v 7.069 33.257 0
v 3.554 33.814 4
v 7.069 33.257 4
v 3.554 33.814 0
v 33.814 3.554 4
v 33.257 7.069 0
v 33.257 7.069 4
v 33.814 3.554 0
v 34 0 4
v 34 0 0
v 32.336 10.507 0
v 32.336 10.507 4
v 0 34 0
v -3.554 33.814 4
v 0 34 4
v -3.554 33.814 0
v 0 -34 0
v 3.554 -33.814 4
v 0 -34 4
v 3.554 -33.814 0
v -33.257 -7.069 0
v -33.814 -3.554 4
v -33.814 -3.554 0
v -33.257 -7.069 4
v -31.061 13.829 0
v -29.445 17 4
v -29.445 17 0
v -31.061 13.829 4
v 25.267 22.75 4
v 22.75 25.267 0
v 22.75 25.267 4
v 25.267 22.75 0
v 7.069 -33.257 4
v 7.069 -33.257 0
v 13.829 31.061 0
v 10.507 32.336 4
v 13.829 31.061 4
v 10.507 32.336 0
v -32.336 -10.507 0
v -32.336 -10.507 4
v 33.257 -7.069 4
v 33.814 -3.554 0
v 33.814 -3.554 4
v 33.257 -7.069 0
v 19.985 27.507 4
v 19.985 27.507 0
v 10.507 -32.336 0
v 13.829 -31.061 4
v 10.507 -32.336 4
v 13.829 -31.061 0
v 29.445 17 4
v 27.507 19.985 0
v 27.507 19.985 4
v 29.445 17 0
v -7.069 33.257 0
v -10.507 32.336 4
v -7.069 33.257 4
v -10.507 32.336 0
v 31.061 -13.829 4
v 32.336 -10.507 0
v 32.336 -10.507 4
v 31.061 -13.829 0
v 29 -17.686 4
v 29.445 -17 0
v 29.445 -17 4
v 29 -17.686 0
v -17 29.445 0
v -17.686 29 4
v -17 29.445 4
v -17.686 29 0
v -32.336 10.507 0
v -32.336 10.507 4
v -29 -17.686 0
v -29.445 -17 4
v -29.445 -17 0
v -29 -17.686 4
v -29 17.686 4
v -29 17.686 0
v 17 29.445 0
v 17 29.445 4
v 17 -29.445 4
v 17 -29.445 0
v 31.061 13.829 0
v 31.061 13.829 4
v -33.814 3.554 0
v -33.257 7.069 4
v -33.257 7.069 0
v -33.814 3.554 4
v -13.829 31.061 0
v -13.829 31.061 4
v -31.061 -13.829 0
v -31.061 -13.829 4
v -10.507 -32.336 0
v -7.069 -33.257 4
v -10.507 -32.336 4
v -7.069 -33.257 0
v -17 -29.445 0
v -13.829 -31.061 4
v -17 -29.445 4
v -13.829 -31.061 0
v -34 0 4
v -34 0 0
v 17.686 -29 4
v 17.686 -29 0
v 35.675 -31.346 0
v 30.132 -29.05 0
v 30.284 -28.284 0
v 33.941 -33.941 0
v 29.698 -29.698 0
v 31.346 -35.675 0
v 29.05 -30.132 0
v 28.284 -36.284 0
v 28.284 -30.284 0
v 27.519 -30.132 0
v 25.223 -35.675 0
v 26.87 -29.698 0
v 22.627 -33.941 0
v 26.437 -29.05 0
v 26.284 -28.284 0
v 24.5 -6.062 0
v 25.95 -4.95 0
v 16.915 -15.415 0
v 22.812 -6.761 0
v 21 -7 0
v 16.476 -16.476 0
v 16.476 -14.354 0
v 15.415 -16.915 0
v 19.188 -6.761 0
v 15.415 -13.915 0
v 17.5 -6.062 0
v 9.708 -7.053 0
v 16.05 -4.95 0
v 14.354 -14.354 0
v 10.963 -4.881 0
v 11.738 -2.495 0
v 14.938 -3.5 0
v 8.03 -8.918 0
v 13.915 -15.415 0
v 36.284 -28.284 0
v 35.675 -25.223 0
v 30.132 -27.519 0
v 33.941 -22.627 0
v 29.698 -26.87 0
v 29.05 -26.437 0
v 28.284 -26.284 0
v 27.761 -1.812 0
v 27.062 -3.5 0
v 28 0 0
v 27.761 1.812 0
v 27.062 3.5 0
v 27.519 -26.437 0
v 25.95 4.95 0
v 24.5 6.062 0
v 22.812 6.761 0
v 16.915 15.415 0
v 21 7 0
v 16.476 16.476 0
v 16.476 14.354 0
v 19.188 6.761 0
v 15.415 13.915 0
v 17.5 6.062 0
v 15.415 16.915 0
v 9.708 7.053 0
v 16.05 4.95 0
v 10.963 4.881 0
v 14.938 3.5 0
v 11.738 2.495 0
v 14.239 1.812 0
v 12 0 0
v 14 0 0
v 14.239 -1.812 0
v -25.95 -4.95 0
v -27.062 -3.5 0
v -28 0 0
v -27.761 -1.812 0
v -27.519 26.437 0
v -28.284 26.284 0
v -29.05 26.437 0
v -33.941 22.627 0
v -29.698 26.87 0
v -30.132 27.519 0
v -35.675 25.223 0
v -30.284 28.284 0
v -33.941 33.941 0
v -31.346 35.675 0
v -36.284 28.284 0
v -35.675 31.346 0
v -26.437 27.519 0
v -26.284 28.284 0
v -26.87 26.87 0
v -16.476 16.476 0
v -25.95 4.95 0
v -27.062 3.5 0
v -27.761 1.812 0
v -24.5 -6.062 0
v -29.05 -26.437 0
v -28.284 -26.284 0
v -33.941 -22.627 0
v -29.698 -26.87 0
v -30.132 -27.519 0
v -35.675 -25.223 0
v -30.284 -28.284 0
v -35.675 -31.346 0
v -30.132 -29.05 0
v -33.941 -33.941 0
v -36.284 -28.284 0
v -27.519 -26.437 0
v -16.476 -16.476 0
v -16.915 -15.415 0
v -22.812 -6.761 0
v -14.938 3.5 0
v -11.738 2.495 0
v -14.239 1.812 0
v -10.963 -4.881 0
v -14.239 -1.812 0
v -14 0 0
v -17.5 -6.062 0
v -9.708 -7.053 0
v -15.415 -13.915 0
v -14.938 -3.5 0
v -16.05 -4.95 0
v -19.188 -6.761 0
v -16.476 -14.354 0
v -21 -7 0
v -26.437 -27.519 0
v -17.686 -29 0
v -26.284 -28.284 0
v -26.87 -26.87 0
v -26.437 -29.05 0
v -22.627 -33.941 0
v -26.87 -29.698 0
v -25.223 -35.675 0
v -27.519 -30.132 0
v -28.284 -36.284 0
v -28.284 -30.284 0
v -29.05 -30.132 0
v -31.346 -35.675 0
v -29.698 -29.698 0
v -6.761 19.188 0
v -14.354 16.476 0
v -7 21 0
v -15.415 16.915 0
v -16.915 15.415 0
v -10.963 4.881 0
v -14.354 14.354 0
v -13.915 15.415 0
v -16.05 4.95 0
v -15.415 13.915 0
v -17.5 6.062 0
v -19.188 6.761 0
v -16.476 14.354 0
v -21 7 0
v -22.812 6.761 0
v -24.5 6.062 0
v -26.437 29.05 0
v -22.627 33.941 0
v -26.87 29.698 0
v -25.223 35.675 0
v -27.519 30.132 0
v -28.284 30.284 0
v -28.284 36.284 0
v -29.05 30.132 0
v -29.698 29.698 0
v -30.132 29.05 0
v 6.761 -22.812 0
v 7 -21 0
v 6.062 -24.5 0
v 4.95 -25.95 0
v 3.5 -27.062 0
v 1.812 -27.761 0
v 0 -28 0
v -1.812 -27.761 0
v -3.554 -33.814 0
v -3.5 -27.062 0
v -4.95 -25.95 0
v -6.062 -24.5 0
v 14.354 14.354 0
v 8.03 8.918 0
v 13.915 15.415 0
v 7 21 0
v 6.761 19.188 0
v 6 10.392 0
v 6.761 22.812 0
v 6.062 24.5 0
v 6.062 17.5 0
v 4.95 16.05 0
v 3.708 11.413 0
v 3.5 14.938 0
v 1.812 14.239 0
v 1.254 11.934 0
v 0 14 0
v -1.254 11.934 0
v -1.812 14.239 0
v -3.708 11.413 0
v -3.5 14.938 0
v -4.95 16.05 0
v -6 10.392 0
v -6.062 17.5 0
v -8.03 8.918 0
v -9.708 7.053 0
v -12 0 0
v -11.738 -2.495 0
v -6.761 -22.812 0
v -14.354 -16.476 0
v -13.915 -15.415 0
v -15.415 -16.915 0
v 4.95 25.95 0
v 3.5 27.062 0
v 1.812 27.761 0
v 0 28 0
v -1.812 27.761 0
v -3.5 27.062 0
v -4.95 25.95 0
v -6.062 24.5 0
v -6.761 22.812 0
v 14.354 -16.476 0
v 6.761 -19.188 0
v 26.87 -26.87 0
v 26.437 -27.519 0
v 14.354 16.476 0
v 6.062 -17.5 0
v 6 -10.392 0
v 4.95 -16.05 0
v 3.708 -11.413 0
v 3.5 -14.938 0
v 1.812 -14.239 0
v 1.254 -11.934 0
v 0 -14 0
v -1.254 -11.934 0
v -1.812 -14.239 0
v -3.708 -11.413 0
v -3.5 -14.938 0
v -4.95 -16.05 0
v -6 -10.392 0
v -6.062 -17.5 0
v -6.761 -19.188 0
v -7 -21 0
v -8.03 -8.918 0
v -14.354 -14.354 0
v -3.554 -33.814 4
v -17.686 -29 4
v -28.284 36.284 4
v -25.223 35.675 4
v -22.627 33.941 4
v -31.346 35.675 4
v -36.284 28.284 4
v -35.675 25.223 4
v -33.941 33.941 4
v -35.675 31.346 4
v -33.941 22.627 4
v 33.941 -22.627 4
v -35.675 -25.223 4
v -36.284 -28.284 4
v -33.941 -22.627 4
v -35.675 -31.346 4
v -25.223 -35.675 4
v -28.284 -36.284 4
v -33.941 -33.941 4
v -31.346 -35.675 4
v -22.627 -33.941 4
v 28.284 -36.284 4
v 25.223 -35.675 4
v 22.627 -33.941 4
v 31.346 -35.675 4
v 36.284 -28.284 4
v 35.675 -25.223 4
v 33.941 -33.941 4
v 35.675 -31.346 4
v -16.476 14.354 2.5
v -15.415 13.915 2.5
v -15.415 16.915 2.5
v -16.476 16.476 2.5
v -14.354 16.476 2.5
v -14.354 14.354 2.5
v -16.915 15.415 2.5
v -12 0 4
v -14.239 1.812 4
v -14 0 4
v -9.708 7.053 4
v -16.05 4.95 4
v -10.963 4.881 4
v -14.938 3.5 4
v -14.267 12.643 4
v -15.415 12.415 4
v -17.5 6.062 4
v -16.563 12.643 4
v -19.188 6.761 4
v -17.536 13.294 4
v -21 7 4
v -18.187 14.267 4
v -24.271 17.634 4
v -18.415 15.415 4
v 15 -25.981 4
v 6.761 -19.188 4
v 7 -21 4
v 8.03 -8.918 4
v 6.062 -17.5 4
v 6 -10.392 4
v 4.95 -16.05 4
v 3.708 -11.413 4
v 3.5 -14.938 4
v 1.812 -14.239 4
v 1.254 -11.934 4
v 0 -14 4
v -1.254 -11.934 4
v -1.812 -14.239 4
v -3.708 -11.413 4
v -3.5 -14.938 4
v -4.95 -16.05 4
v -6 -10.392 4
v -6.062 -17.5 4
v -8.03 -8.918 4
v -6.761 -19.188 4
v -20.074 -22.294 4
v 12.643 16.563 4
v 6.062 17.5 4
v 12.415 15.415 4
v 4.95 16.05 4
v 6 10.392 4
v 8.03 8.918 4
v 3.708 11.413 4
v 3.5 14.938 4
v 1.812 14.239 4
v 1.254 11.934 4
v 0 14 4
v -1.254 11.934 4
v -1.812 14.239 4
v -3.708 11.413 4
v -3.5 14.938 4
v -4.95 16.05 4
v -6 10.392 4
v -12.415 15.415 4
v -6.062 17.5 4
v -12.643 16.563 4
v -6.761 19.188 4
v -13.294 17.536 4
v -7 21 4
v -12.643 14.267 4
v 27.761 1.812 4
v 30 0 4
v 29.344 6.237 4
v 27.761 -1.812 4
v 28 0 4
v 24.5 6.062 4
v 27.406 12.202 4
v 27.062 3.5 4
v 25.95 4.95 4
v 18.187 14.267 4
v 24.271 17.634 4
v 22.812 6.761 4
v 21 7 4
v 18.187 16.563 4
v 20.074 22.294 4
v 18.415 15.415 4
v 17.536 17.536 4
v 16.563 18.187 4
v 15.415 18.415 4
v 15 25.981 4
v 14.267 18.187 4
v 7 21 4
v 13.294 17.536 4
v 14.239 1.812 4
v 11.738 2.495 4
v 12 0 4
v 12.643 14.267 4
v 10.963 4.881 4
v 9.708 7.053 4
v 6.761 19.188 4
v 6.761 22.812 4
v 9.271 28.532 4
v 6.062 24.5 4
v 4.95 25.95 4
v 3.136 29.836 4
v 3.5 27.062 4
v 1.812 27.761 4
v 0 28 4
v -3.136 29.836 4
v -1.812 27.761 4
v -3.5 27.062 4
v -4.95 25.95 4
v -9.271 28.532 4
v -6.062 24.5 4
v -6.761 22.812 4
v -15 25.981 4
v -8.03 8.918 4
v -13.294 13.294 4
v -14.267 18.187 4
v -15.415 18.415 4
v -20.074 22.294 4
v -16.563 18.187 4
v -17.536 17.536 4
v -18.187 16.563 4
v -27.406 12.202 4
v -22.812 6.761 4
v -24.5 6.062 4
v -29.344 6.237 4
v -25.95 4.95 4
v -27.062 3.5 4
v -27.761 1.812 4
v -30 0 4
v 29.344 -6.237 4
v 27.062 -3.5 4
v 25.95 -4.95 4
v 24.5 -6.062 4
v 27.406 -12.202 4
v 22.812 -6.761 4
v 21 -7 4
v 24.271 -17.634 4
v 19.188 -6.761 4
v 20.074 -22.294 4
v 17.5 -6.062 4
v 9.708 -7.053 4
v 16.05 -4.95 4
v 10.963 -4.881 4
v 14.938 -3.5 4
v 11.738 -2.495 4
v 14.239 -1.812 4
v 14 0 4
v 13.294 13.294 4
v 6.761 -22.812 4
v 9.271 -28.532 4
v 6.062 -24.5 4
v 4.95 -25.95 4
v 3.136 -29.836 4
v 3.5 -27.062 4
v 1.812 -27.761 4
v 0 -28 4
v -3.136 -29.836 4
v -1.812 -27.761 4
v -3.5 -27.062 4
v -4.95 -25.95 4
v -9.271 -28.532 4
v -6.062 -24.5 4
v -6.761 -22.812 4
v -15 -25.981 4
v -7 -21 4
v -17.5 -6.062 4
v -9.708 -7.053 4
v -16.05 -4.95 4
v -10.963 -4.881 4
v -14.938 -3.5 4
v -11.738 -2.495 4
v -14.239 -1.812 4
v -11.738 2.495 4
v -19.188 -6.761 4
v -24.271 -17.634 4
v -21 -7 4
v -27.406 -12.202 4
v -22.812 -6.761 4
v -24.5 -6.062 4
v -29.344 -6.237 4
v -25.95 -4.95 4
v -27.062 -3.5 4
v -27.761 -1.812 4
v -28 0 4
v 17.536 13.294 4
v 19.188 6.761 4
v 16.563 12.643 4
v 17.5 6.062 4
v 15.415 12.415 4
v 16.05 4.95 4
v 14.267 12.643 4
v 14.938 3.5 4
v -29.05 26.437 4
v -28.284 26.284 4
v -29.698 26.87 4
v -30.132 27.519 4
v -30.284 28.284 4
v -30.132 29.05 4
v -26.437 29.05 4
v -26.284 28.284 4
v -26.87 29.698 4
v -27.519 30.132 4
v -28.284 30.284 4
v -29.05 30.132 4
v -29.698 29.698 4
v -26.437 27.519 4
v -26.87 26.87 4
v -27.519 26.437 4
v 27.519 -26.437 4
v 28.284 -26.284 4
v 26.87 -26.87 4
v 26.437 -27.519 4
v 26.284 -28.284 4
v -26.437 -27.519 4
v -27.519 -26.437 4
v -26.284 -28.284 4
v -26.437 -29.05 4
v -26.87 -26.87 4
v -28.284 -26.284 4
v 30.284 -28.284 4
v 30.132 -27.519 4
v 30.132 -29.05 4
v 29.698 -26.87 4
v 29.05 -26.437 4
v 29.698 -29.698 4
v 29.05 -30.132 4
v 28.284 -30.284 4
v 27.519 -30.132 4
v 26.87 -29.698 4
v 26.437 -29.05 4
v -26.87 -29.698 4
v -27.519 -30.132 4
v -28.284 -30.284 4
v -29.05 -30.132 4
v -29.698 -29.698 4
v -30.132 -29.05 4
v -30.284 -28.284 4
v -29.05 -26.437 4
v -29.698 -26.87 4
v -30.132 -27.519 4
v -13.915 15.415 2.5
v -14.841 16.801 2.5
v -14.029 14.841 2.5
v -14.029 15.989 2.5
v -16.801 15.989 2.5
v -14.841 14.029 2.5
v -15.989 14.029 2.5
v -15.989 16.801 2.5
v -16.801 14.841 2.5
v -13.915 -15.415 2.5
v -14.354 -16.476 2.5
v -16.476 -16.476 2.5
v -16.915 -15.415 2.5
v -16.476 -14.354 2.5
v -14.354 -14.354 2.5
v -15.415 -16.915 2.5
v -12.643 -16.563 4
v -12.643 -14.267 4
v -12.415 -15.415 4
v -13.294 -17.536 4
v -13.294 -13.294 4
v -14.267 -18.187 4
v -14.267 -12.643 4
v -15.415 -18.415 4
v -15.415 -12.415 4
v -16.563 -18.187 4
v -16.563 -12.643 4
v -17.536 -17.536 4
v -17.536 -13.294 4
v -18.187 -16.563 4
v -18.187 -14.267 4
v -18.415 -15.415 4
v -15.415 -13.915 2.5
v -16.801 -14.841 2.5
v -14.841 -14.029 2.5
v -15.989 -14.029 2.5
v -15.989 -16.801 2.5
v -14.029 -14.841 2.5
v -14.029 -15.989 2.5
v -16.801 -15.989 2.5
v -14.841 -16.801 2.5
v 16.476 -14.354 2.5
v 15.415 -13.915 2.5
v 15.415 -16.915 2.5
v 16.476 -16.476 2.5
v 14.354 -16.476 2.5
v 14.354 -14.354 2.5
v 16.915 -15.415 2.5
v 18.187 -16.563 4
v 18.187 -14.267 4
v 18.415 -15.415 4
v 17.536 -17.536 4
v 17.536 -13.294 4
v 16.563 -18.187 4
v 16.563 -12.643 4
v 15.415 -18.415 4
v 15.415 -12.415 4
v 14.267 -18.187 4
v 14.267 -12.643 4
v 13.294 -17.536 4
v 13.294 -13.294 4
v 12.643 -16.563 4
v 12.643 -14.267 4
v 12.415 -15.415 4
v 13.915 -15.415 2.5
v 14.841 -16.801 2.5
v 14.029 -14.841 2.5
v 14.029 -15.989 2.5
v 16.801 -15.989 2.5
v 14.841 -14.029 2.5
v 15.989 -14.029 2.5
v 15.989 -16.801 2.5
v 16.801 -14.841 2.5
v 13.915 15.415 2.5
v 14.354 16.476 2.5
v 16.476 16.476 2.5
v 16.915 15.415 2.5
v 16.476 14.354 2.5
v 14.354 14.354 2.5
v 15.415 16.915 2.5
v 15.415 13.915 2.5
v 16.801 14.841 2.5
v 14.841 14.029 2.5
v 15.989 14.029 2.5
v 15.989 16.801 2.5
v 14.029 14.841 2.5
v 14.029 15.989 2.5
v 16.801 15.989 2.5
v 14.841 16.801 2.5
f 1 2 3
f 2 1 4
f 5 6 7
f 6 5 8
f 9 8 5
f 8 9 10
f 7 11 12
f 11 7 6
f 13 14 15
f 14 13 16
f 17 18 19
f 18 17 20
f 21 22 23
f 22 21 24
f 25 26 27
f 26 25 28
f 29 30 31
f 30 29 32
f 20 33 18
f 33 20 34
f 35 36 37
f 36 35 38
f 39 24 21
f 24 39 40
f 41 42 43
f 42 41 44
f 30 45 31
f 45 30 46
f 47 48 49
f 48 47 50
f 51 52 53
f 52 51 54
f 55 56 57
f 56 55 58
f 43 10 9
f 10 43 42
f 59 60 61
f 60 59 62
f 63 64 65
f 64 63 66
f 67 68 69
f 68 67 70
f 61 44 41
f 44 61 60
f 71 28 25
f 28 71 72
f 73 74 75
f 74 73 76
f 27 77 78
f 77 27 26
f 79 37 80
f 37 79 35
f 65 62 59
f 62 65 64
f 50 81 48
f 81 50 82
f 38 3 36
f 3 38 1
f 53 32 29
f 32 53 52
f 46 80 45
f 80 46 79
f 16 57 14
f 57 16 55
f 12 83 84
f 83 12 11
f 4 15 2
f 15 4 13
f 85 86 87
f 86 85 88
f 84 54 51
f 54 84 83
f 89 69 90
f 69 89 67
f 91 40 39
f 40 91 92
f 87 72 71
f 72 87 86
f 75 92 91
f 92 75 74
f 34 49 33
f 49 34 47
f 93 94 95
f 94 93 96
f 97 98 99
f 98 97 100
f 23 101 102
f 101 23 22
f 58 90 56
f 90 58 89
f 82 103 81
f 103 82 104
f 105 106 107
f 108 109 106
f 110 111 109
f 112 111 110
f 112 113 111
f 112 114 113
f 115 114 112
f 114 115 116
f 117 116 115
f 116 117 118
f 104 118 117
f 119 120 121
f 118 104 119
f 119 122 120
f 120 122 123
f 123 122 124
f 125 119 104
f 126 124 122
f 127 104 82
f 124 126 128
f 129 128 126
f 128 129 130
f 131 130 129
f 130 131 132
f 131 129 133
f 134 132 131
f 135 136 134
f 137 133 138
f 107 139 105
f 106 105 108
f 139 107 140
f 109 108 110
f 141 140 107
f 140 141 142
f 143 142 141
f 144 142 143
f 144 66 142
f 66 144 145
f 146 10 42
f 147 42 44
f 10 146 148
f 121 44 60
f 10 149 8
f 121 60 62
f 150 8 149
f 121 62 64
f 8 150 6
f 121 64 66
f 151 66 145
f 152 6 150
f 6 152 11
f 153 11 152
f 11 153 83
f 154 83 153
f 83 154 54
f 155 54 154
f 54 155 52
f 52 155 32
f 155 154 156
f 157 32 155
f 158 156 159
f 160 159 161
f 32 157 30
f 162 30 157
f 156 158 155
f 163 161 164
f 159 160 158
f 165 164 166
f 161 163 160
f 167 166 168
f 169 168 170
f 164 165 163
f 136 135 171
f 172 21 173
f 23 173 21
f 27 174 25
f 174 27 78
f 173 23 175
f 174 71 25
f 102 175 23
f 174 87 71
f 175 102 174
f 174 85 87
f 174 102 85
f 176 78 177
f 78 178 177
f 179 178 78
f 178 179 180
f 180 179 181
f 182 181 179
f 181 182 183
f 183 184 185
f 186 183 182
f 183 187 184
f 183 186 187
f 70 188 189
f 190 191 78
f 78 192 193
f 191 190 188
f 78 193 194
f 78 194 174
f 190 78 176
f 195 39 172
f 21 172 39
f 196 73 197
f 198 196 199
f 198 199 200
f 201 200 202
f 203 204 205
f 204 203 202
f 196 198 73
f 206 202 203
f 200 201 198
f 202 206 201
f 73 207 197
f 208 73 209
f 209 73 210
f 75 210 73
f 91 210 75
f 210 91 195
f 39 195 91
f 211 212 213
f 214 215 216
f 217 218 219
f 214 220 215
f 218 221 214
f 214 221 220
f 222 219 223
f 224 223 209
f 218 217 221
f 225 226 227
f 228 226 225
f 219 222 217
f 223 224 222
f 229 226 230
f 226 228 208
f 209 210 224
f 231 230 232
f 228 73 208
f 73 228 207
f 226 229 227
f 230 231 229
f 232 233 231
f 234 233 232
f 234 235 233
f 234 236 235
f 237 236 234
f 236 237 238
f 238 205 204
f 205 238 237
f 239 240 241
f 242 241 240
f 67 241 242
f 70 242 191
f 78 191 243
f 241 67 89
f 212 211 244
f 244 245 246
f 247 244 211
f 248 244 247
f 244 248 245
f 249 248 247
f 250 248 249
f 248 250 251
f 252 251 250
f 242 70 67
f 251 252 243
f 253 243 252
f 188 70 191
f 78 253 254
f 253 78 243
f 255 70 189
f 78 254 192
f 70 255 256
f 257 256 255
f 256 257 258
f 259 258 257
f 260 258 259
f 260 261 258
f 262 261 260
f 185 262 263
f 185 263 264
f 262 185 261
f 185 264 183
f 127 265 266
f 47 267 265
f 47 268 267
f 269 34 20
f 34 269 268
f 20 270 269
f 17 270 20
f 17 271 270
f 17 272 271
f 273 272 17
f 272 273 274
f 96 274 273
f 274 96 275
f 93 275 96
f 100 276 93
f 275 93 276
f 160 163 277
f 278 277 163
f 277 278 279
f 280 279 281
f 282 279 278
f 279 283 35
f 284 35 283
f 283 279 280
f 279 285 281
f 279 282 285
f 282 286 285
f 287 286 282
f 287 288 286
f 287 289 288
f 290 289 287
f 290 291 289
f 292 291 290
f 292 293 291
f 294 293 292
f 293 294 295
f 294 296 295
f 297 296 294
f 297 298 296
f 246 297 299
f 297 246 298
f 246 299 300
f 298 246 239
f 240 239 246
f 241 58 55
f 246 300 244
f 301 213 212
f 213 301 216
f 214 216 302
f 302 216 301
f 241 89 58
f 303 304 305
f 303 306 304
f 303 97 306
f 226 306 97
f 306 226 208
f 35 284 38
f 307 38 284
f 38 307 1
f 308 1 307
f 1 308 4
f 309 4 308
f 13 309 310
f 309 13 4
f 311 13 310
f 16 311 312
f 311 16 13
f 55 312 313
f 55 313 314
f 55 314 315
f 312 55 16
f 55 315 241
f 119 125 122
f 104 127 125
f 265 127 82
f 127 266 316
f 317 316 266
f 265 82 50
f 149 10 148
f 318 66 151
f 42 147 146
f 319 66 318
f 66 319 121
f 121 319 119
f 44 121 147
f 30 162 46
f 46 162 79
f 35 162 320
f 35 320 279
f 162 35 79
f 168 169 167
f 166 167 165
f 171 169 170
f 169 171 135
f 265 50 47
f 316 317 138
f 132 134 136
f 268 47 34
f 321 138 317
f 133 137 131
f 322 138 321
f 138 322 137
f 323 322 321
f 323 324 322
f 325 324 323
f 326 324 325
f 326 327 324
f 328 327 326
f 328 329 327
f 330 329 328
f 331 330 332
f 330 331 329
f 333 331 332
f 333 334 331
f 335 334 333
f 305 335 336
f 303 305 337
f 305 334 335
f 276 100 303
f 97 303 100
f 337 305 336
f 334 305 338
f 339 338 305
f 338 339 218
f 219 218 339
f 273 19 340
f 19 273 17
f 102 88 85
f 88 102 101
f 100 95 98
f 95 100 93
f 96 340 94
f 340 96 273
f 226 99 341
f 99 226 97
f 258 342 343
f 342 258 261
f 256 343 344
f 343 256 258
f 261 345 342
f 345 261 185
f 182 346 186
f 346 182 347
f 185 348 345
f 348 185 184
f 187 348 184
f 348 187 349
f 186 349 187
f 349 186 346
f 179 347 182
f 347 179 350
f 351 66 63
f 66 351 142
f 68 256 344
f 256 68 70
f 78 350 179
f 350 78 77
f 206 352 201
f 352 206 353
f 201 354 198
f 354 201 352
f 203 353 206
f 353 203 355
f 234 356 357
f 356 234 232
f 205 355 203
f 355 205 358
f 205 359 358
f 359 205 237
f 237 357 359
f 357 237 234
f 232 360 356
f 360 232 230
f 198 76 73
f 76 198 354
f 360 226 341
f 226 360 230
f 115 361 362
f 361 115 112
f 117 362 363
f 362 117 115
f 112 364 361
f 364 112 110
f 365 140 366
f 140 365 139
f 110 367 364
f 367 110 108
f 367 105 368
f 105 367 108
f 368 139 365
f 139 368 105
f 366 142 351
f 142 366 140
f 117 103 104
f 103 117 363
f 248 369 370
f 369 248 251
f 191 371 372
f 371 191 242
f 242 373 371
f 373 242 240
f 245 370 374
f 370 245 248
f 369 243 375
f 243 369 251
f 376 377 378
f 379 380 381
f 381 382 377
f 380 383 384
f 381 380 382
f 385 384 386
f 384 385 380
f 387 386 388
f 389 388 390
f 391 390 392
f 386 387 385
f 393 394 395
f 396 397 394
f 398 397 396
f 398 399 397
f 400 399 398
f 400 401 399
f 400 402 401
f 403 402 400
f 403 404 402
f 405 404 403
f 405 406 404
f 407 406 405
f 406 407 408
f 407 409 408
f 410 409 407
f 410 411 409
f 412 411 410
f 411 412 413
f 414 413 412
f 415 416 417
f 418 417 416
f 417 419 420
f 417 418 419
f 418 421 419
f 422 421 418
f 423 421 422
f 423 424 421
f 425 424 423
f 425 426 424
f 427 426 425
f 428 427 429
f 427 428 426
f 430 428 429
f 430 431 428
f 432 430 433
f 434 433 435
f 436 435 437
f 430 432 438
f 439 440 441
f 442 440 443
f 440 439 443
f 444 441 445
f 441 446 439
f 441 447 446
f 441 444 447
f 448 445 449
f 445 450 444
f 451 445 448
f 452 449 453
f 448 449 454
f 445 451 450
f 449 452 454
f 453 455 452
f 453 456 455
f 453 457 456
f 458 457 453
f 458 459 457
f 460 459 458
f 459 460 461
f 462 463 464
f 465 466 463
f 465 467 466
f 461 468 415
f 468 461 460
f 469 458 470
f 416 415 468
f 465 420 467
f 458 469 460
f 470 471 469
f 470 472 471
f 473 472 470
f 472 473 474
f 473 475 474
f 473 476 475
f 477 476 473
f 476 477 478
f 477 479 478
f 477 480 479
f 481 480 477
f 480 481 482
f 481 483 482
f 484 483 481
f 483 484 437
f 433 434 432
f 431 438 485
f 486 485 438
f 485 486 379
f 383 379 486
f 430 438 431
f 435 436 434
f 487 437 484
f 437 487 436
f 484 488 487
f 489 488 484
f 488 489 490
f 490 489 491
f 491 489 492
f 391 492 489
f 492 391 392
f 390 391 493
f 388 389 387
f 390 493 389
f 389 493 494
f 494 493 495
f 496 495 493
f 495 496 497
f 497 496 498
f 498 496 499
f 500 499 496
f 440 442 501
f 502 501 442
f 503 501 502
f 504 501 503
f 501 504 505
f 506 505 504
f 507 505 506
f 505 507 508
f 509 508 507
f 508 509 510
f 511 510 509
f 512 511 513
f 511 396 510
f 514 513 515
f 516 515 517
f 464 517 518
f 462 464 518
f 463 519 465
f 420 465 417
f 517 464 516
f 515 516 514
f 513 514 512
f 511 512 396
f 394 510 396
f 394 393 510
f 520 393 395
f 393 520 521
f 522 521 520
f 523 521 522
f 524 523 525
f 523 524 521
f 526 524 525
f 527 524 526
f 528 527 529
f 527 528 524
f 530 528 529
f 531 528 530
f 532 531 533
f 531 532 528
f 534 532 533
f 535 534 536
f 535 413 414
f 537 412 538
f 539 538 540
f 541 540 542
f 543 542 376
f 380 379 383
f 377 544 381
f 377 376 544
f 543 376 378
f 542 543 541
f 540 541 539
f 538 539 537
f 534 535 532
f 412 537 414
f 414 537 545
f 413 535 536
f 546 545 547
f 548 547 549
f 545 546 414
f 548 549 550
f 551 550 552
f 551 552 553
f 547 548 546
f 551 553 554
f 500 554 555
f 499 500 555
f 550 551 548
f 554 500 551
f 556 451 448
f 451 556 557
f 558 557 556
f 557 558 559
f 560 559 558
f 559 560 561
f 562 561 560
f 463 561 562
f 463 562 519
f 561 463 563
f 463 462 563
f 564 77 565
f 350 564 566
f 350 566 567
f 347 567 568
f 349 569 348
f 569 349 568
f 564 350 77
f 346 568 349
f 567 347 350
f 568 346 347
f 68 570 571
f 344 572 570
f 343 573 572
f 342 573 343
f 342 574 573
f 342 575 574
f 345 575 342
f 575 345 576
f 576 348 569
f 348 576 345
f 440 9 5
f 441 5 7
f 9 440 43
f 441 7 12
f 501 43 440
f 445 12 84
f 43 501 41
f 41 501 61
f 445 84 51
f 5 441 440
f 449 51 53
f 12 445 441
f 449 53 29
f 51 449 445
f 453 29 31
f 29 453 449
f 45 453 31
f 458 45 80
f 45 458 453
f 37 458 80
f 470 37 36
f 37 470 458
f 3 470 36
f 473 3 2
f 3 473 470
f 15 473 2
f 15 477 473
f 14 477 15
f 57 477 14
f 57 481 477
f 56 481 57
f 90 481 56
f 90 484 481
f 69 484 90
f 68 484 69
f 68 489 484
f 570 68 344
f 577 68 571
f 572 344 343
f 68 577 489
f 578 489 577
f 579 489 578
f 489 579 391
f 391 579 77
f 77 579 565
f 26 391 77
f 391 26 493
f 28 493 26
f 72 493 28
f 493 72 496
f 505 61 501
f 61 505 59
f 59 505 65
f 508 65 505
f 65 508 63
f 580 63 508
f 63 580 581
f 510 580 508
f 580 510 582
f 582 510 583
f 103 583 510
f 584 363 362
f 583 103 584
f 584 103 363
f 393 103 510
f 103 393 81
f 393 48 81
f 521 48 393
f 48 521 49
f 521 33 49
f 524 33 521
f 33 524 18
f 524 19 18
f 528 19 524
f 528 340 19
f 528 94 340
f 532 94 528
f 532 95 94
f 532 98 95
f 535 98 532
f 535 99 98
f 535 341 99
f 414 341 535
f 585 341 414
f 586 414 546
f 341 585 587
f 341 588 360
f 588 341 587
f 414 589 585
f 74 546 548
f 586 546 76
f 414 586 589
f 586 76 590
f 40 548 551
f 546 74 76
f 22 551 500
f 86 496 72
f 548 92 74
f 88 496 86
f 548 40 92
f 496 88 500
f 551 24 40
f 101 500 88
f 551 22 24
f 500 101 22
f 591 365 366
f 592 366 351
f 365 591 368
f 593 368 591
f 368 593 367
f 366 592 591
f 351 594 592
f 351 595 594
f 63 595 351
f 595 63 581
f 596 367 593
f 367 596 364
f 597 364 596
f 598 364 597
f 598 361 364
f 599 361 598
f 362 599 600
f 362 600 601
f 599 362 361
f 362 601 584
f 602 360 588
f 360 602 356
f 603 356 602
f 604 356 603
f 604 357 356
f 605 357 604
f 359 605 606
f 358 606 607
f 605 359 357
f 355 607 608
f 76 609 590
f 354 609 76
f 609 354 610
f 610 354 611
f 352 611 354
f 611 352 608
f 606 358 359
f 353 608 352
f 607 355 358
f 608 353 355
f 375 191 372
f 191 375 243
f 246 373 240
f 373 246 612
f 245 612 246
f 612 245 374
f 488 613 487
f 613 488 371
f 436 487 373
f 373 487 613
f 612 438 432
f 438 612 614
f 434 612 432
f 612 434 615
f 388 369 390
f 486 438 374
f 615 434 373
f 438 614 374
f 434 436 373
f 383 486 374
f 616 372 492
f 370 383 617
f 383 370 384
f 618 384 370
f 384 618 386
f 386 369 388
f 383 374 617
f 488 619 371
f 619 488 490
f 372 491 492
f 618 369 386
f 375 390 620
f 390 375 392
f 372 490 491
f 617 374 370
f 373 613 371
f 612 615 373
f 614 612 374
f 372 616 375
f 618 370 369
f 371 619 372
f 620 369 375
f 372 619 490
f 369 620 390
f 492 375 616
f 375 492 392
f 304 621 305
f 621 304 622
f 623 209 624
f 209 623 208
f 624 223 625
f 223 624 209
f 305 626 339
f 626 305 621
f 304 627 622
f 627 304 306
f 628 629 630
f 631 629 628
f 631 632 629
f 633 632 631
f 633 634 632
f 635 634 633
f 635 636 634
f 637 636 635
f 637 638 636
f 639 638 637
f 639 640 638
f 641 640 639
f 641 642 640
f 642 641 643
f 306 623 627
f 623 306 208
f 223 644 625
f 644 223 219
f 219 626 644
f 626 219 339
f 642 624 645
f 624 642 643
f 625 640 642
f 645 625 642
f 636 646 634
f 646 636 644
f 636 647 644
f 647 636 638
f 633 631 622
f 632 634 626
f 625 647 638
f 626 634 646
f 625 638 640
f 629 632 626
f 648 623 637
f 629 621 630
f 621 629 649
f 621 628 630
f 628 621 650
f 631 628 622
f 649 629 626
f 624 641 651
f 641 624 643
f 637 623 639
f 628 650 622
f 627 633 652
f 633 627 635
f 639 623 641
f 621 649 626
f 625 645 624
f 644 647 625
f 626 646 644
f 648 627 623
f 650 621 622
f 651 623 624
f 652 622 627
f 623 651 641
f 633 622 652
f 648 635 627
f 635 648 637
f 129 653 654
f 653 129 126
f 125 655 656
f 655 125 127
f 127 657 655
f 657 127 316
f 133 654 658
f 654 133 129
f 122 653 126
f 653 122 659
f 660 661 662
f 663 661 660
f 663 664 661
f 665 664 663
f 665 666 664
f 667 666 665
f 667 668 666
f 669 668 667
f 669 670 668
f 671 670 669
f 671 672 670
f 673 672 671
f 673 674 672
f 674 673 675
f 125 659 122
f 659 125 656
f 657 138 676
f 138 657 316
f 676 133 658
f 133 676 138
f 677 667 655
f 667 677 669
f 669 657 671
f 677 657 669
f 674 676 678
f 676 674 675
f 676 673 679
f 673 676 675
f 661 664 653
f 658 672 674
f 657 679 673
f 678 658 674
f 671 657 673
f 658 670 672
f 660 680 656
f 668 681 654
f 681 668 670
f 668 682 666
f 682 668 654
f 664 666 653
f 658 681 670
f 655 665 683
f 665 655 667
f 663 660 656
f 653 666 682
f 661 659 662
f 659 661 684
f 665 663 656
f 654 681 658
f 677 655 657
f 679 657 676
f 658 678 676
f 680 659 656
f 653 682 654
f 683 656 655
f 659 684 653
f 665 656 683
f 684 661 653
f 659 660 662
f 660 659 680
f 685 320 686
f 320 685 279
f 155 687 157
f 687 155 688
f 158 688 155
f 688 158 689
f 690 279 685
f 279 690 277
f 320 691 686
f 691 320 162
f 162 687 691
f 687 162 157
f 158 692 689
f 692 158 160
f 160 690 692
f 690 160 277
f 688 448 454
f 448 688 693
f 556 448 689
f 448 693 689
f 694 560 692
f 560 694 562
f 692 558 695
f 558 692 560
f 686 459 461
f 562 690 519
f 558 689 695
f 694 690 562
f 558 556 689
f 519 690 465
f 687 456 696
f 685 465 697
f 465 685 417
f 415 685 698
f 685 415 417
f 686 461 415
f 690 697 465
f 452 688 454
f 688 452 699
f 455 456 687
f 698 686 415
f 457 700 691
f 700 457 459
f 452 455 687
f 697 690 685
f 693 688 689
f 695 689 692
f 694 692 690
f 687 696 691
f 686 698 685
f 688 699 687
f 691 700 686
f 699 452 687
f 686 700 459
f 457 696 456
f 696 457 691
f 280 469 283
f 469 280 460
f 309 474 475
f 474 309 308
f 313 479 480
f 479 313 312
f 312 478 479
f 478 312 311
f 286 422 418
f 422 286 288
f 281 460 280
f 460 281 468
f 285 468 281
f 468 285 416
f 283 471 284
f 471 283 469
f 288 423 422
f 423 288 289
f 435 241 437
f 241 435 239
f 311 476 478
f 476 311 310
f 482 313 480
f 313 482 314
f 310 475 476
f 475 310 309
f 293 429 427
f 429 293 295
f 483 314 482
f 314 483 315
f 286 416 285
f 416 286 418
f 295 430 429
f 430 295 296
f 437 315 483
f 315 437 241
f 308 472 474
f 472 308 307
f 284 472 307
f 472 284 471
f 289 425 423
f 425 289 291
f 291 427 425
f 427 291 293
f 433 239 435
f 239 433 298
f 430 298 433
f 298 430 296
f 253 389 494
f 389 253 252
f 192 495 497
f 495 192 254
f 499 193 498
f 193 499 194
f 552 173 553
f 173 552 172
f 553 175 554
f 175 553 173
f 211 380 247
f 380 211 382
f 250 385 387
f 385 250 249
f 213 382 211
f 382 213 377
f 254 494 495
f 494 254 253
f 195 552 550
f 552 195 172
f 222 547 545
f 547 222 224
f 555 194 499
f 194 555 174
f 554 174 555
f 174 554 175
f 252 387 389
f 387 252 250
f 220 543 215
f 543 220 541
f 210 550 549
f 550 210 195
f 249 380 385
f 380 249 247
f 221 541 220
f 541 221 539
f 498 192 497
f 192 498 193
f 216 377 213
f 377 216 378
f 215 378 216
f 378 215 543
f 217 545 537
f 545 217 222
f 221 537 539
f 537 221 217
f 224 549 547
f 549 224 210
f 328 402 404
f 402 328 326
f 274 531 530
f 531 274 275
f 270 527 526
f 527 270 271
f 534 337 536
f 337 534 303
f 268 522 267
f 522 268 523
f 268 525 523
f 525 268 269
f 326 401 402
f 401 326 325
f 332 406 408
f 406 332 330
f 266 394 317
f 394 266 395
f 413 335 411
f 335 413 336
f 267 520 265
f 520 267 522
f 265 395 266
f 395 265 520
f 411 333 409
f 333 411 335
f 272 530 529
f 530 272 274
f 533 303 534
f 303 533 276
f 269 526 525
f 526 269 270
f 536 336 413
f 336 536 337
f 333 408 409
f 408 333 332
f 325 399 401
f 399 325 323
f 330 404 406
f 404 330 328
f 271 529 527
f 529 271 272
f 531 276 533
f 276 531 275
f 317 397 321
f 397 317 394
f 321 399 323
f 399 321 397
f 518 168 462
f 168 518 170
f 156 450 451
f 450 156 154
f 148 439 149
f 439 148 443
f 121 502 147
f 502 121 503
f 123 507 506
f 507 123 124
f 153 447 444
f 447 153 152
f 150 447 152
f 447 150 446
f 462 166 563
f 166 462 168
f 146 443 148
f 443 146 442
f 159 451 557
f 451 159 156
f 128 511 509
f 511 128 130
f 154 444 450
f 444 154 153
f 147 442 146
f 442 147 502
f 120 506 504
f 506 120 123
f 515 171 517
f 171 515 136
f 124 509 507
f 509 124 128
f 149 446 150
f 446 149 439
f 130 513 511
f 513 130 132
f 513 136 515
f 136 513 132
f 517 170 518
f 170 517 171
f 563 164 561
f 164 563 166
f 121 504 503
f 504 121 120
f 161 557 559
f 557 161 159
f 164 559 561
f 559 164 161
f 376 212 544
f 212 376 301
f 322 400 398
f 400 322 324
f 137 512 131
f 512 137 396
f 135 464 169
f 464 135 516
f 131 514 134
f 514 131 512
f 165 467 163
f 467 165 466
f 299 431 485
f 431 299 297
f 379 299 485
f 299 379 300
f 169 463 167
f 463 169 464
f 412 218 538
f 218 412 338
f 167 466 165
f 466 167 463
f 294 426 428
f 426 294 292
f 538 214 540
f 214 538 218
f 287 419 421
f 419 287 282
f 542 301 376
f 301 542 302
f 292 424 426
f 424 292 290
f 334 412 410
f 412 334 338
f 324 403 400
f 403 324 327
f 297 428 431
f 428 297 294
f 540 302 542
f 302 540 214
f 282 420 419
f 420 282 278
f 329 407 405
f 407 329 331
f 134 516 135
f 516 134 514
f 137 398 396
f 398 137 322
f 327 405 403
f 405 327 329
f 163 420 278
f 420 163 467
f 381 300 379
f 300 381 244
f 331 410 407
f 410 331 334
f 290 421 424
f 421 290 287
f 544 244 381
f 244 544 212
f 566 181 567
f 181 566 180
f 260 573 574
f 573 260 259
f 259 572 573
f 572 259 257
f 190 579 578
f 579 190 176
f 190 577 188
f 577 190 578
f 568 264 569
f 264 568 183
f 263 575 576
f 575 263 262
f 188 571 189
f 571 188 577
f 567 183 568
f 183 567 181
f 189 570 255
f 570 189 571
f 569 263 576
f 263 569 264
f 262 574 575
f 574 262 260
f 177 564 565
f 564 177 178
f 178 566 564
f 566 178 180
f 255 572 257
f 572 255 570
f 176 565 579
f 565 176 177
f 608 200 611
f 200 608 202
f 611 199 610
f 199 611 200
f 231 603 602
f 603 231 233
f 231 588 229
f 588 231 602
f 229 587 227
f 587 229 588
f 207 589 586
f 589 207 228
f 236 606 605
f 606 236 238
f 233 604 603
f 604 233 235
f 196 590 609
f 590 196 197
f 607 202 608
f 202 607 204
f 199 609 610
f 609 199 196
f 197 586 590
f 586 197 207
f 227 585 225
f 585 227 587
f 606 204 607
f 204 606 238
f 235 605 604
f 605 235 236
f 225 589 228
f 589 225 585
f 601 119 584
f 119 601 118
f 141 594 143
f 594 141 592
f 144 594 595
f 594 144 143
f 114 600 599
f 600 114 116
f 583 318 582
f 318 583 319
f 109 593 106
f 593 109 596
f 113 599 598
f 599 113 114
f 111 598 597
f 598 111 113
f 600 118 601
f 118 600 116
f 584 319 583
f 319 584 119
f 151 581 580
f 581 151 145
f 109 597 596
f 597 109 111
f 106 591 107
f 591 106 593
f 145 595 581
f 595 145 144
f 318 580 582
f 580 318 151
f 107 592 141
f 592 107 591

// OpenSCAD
// file: includes/includes/jonaskuehling-default.scad
module teardrop (r=4.5,h=20,alpha=45,teardropcorner=0,fulldrop=false){		// tear drop hole for top-centering
											// use teardropcorner=1 for bottom horizontal corners
	render()
	translate([-h/2,0,0])
		rotate([-270,0+(teardropcorner*180),90])
			difference(){
				linear_extrude(height=h){
					circle(r, $fn=24);
					polygon(points=[[0,0],[r*cos(alpha),r*sin(alpha)],[0,r/sin(alpha)],[-r*cos(alpha),r*sin(alpha)]], paths=[[0,1,2,3]]);
				}
				if(fulldrop==false) 
					translate([0,(r/sin(alpha))/2+r,h/2]) cube([2*r+2,r/sin(alpha),h+2],center=true);
			}
}

//teardrop(4.5,22,fulldrop=true);



module teardropcentering (r=4.5,h=20,alpha=45){				// tear drop hole for top-centering
	centering_offset_factor = 1.1;
	render()
	translate([-h/2,0,0])
		rotate([-270,0,90])
			difference(){
				linear_extrude(height=h){
					circle(r, $fn=24);
					polygon(points=[[0,0],[r*cos(alpha),r*sin(alpha)],[0,r/sin(alpha)],[-r*cos(alpha),r*sin(alpha)]], paths=[[0,1,2,3]]);
				}
				translate([0,(r/sin(alpha))/2+r*centering_offset_factor,h/2]) cube([2*r+2,r/sin(alpha),h+2],center=true);
			}
}

//teardropcentering();



module teardropcentering_half (r=4.5,h=20, bottom=0,alpha=45){				// tear drop hole for top-centering
																// upper half (bottom=0) or bottom half (bottom=1)
	centering_offset_factor = 1.2;
	render()
	translate([-h/2,0,0])
		rotate([-270,0,90])
			difference(){
				linear_extrude(height=h){
					circle(r, $fn=24);
					polygon(points=[[0,0],[r*cos(alpha),r*sin(alpha)],[0,r/sin(alpha)],[-r*cos(alpha),r*sin(alpha)]], paths=[[0,1,2,3]]);
				}
				translate([0,(r/sin(alpha))/2+r*centering_offset_factor,h/2]) cube([2*r+2,r/sin(alpha),h+2],center=true);
				translate([0,-(r*centering_offset_factor)/2-0.5+bottom*(r*centering_offset_factor+1),h/2]) cube([2*r+2,r*centering_offset_factor+1,h+2],center=true);
			}
}

//teardropcentering_half(bottom=0);


module polyhole(d,h){
	n = max(round(2 * d),3);
	cylinder(h = h, r = (d / 2) / cos (180 / n), $fn = n, center=true);
}



module roundcorner(radius,edge_length){
	render()
	translate([0,0,-1])
		difference(){
			translate([-1,-1,0]) cube(size = [radius+1,radius+1,edge_length+2], center = false);
			translate(v = [radius,radius,-1]) cylinder(h = edge_length+4, r=radius, center=false);
		}
}

//roundcorner(5,5);



module roundcorner_tear(radius,edge_length){
	render()
	difference(){
		translate([-1,-1,-1]) cube(size = [edge_length+2, radius+1, radius+1], center = false);
		translate([(edge_length+4)/2-2, radius, radius])
			teardrop(radius, edge_length+4,teardropcorner=1);
	}
}

//roundcorner_tear(8,20);



module nut_trap(nut_wrench_size,trap_height,vertical=true, clearance=0.2){		// M3 wrench size = 5.5
	cornerdiameter =  (((nut_wrench_size)/2)+clearance) / cos(180/6);
	rotate([0,vertical*90,0])
		cylinder(h = trap_height, r = cornerdiameter, center=true, $fn = 6);
}



module nut_slot(nut_wrench_size,nut_height, nut_elevation,vertical=false, clearance=0.2){		// M3 wrench size = 5.5
	cornerdiameter =  (((nut_wrench_size)/2)+clearance) / cos(180/6);
	slot_height = nut_height+2*clearance;
	slot_width = nut_wrench_size+2*clearance;
	rotate([0,vertical*270,0]){
		cylinder(h = slot_height, r = cornerdiameter, center=true, $fn = 6);
		translate([0,-slot_width/2,-slot_height/2]) cube([nut_elevation+1,slot_width,slot_height]);
	}
}

//nut_slot(5.5,3,4,1);



module barbell (x1,x2,r1,r2,r3,r4) 
{
	x3=triangulate (x1,x2,r1+r3,r2+r3);
	x4=triangulate (x2,x1,r2+r4,r1+r4);
	render()
	difference ()
	{
		union()
		{
			translate(x1)
			circle (r=r1);
			translate(x2)
			circle(r=r2);
			polygon (points=[x1,x3,x2,x4]);
		}
		
		translate(x3)
		circle(r=r3,$fa=5);
		translate(x4)
		circle(r=r4,$fa=5);
	}
}

function triangulate (point1, point2, length1, length2) = 
point1 + 
length1*rotated(
atan2(point2[1]-point1[1],point2[0]-point1[0])+
angle(distance(point1,point2),length1,length2));

function distance(point1,point2)=
sqrt((point1[0]-point2[0])*(point1[0]-point2[0])+
(point1[1]-point2[1])*(point1[1]-point2[1]));

function angle(a,b,c) = acos((a*a+b*b-c*c)/(2*a*b)); 

function rotated(a)=[cos(a),sin(a),0];
// file: includes/lm8uu-holder-slim_double-vertical.scad
// LM8UU holder slim
// *********************************************
// Jonas Kühling
// http://www.jonaskuehling.de
// http://www.thingiverse.com/jonaskuehling
// *********************************************
// derived from:
// http://www.thingiverse.com/thing:14942

use <includes/jonaskuehling-default.scad>

// LM8UU/rod dimensions
LM8UU_dia = 15.4;
LM8UU_length = 24;
rod_dia = 8;

//screw/nut dimensions (M3) - hexagon socket head cap screw ISO 4762, hexagon nut ISO 4032
screw_thread_dia_iso = 3;
screw_head_dia_iso = 5.5;
nut_wrench_size_iso = 5.5;


// screw/nut dimensions for use (plus clearance for fitting purpose)
clearance_dia = 0.5;
screw_thread_dia = screw_thread_dia_iso + clearance_dia;
screw_head_dia = screw_head_dia_iso + clearance_dia;
nut_wrench_size = nut_wrench_size_iso + clearance_dia;
nut_dia_perimeter = (nut_wrench_size/cos(30));
nut_dia = nut_dia_perimeter;
nut_surround_thickness = 2;

// main body dimensions
body_wall_thickness = 2;
body_width = LM8UU_dia + (2*body_wall_thickness);
body_height = body_width;
body_length = 60;
gap_width = rod_dia + 2;
screw_bushing_space = 1;
screw_elevation = LM8UU_dia + body_wall_thickness + (screw_thread_dia/2) +screw_bushing_space;

overhang_angle = 60;
r = nut_dia_perimeter/2+nut_surround_thickness;
extra_height_varticalprint = r*sin(90-overhang_angle);

// TEST - uncomment to render in openscad:
//lm8uu_holder_slim_double_vertical();		



// main body
module lm8uu_holder_slim_double_vertical()
{
	// rotate vertical and center bearing around z-axis
	translate([0,-(LM8UU_dia/2+body_wall_thickness),body_length/2])
	rotate([-90,0,0])
	difference()
	{
		union()
		{	
			// body
			translate([-body_width/2,-body_length/2,body_height/2])
				cube([body_width,body_length,(LM8UU_dia/2)+screw_bushing_space+(screw_thread_dia/2)+extra_height_varticalprint]);
			translate([0,0,(LM8UU_dia/2)+body_wall_thickness])		
				rotate([90,0,0])
					cylinder(r=(LM8UU_dia/2)+body_wall_thickness, h=body_length, center=true);
	
			// gap support
			translate([-(gap_width/2)-body_wall_thickness,-(body_length/2),body_height/2])
				cube([body_wall_thickness,LM8UU_length,(LM8UU_dia/2)+screw_bushing_space+(screw_thread_dia/2)]);
			translate([gap_width/2,-(body_length/2),body_height/2])
				cube([body_wall_thickness,LM8UU_length,(LM8UU_dia/2)+screw_bushing_space+(screw_thread_dia/2)]);
	
			for(i=[-(body_length/2-LM8UU_length/2),(body_length/2-LM8UU_length/2)])
			{
				// nut trap surround
				translate([gap_width/2,i,screw_elevation])
					rotate([0,90,0])
						cylinder(r=(((nut_wrench_size+nut_surround_thickness*2)/cos(30))/2), h=(body_width-gap_width)/2, $fn=20);
	
				// Screw hole surround
				translate([-gap_width/2,i,screw_elevation])
					rotate([0,-90,0])
						cylinder(r=(screw_head_dia/2)+nut_surround_thickness, h=(body_width-gap_width)/2, $fn=20);
			}
		}
	
		// bushing hole
		translate([0,0,LM8UU_dia/2+2])
			rotate([90,0,0])
				polyhole(d=LM8UU_dia, h=body_length+1, center=true);
	
		// top gap
		translate([-(gap_width/2),-(body_length/2)-1,body_height/2])
			cube([gap_width,body_length+2,(LM8UU_dia/2)+screw_bushing_space+(screw_thread_dia/2)+(nut_dia/2)+nut_surround_thickness+1]);
	
		for(i=[-(body_length/2-LM8UU_length/2),(body_length/2-LM8UU_length/2)])
		{
			// screw hole (one all the way through)
			translate([0,i,screw_elevation])
				rotate([0,90,0])
					polyhole(d=screw_thread_dia, h=body_width+3, center=true);
		
			// nut trap
			translate([gap_width/2+body_wall_thickness,i,screw_elevation])
				rotate([0,90,0])
					cylinder(r=nut_dia/2, h=body_width/2-gap_width/2-body_wall_thickness+1,$fn=6);
		
			// screw head hole
			translate([-(gap_width)/2-body_wall_thickness,i,screw_elevation])
				rotate([0,-90,0])
					cylinder(r=screw_head_dia/2, h=body_width/2-gap_width/2-body_wall_thickness+1,$fn=20);

		}	
	}
}

/*
// Based on nophead research
module polyhole(d,h,center=false) {
    n = max(round(2 * d),3);
    rotate([0,0,180])
        cylinder(h = h, r = (d / 2) / cos (180 / n), center=center, $fn = n);
}
*/
// file: common.scad
include <configuration.scad>;
use <includes/parametric_involute_gear_v5.0.scad>;
use <includes/SolidReplacementTruss.scad>;
include <includes/lm8uu-holder-slim_double-vertical.scad>;

// Generic spline gear with a herringbone section
module spline_gear(number_of_teeth, circular_pitch, pressure_angle,
                   height, helix_height, twist, backlash, clearance) {
  gear(number_of_teeth=number_of_teeth,
	     circular_pitch=circular_pitch,
	     pressure_angle=pressure_angle,
	     clearance = clearance,
	     gear_thickness = height - helix_height,
   	     rim_thickness = height - helix_height,
	     rim_width = 5,
	     hub_thickness = height - helix_height,
	     hub_diameter=0,
         bore_diameter=0,
	     circles=0,
         backlash=backlash,
	     twist=0);
  translate([0, 0, height - helix_height])
    gear(number_of_teeth=number_of_teeth,
	     circular_pitch=circular_pitch,
	     pressure_angle=pressure_angle,
	     clearance = clearance,
	     gear_thickness = helix_height/2,
   	     rim_thickness = helix_height/2,
	     rim_width = 5,
	     hub_thickness = helix_height/2,
	     hub_diameter=0,
         bore_diameter=0,
	     circles=0,
         backlash=backlash,
	     twist=twist);
  rotate([0, 0, -twist])
  translate([0, 0, height - helix_height/2])
    gear(number_of_teeth=number_of_teeth,
	     circular_pitch=circular_pitch,
	     pressure_angle=pressure_angle,
	     clearance = clearance,
	     gear_thickness = helix_height/2,
   	     rim_thickness = helix_height/2,
	     rim_width = 5,
	     hub_thickness = helix_height/2,
	     hub_diameter=0,
         bore_diameter=0,
	     circles=0,
         backlash=backlash,
	     twist=-twist);
}

// Simplified module for creating flexsplines (with helix section)
module flexspline_helix_gear(height, backlash, clearance) {
  spline_gear(number_of_teeth=flex_teeth,
	     circular_pitch=pitch,
	     pressure_angle=press_angle,
	     height=height,
         helix_height=tooth_overlap,
         backlash=backlash,
         clearance = clearance,
	     twist=-helix_twist);

}

// Simplified module for creating flexsplines (without helix section)
module flexspline_gear(height, backlash, clearance) {
  gear(number_of_teeth=flex_teeth,
	     circular_pitch=pitch,
	     pressure_angle=press_angle,
	     clearance = clearance,
	     gear_thickness = height,
   	     rim_thickness = height,
	     rim_width = 5,
	     hub_thickness = height,
	     hub_diameter=0,
         bore_diameter=0,
	     circles=0,
         backlash=backlash,
	     twist=0);
}

// Variation of the truss_platform, does not try to make the edges
// vertical but instead leaves them slanted.
module my_truss_platform(length, width, height, thickness,
			 element_width, radius) 
{ 
  segments = 2*floor(width/height)+1; 
  seg_width = width/(segments+1);
    
  if (segments > 0)
    for(i = [1 : segments])
      {
	translate([0, (seg_width)*(i-1)+2*seg_width*(1+pow(-1,i))/2, 
		   (height)*(1+pow(-1,i))/2])
	  {
	    rotate([180*(1+pow(-1, i))/2, 0, 0])
	      isoc_truss(length, seg_width*2, height, thickness, 
			 element_width, radius);
	  }
      }
}

module z_end_bottom_clamp_bolts() {
  translate([0, -7, 0]) rotate([0, 90, 0]) cylinder(r=1.5, h=20);
  translate([0, 7, 0]) rotate([0, 90, 0]) cylinder(r=1.5, h=20);  
}
// file: circspline.scad
include <configuration.scad>;
include <common.scad>;

module circspline_helix() {
  difference() {
    cylinder(r=circ_outer_r, h=circ_h, $fn=60);
    spline_gear(number_of_teeth=flex_teeth + teeth_diff,
	     circular_pitch=pitch,
	     pressure_angle=press_angle,
	     height=circ_h,
         helix_height=tooth_overlap,
         backlash=-0.2,
         clearance = circ_tooth_clearance,
	     twist=helix_twist);
  }
}

module circspline() {
  difference() {
    cylinder(r=circ_outer_r, h=circ_h, $fn=60);
    gear(number_of_teeth=flex_teeth + teeth_diff,
	     circular_pitch=pitch,
	     pressure_angle=press_angle,
	     clearance = circ_tooth_clearance,
	     gear_thickness = circ_h,
   	     rim_thickness = circ_h,
	     rim_width = 5,
	     hub_thickness = circ_h,
	     hub_diameter=0,
         bore_diameter=0,
	     circles=0,
         backlash=-0.2,
	     twist=0);
  }
}

module circspline_block() {
  difference() {
    union() {
      circspline();
      cylinder(r=circ_outer_r, h=circ_bottom_h, $fn=60);
      if (demo_mount) {
        difference() {
          translate([-demo_mount/2, -demo_mount/2, 0])
            cube([demo_mount, demo_rod2 + demo_mount, demo_mount]);
          cylinder(r=circ_outer_r-0.1, h=circ_h, $fn=60);
          translate([0, demo_rod1, 0]) cylinder(r=4, h=circ_h, $fn=20);
          translate([0, demo_rod2, 0]) cylinder(r=4, h=circ_h, $fn=20);
          translate([-demo_mount/2-1, demo_rodh, demo_mount/2]) 
            rotate([0, 90, 0]) cylinder(r=4, h=circ_h, $fn=20);
        }
      }
    }
    // NEMA17 screw holes
    for (i = [45 : 90 : 315]) {
      rotate(i, [0, 0, 1])
      translate([0, 21.8, 0])
      union() {
        cylinder(r = 1.5, h = circ_bottom_h, $fn=8);
        translate([0, 0, circ_bottom_h - 1.5])
          cylinder(r1 = 1.5, r2 = 3, h = 1.5, $fn=16);
      }
    }
    cylinder(r = 12, h = circ_bottom_h); // NEMA17 central hole
  }
}

module circspline_mount(extra=0) {
  translate([0, circ_mount_r, 0]) cylinder(r=8+extra, h=circ_mount_h, $fn=16);
  translate([-8-extra, 0, 0]) cube([16+extra*2, circ_mount_r, circ_mount_h]);
}

module circspline_mount_void() {
  translate([0, circ_mount_r, 0]) cylinder(r=2, h=circ_mount_h, $fn=16);
}

// Circspline that mounts to the carriage.
module circspline_unit() {
  difference() {
    union() {
      circspline_helix();
      cylinder(r=circ_outer_r, h=circ_bottom_h, $fn=60);
      difference() {
        union() {
          rotate([0, 0, circ_mount_1]) circspline_mount();
          rotate([0, 0, circ_mount_2]) circspline_mount();
          rotate([0, 0, circ_mount_3]) circspline_mount();
        }
        cylinder(r=circ_outer_r-1, h=circ_h, $fn=60);
      }
    }
    // Cut out unnecessary toothing
    translate([0, 0, circ_bottom_h])
      cylinder(r=circ_inner_r, h=circ_h-circ_bottom_h-tooth_overlap-2);
    translate([0, 0, circ_h-tooth_overlap-2])
      cylinder(r1=circ_inner_r, r2=circ_inner_r-2, h=2);
    // NEMA17 screw holes
    for (i = [45 : 90 : 315]) {
      rotate(i, [0, 0, 1])
      translate([0, 21.8, 0])
      union() {
        cylinder(r = 1.5, h = circ_bottom_h, $fn=8);
        translate([0, 0, circ_bottom_h - 1.5])
          cylinder(r1 = 1.5, r2 = 3, h = 1.5, $fn=16);
      }
    }
    // Lightening the construction. Also peepholes.
    for (i = [0 : 90 : 360]) {
      rotate(i, [0, 0, 1])
      translate([0, 21, 0])
      cylinder(r = 7, h = circ_bottom_h, $fn=24);
    }
    cylinder(r = 12, h = circ_bottom_h); // NEMA17 central hole
    rotate([0, 0, circ_mount_1]) circspline_mount_void();
    rotate([0, 0, circ_mount_2]) circspline_mount_void();
    rotate([0, 0, circ_mount_3]) circspline_mount_void();
  }
}

module circspline_unit_spline() {
  difference() {
    circspline_unit();
    cylinder(r=circ_outer_r*2, h=circ_bottom_h, $fn=60);
  }
}

module circspline_unit_motor_mount() {
  intersection() {
    circspline_unit();
    cylinder(r=circ_outer_r*2, h=circ_bottom_h, $fn=60);
  }
}
// file: configuration.scad
// Harmonic drive main parameters
press_angle = 40;
flex_teeth = 50;
teeth_diff = 2;

tol = 0.25; // generic tolerance used in some places
lh = 0.3; // layer height needed in a few places

// Main geometry
bearing_r = 22/2;
bearing_h = 7;
washer_h = 1;
bolthead_h = 4;
stepper_shaft_h = 20;
circ_drive_bearing_indent = 1;
flex_bearing_indent = 1;
drive_bearing_r = 13/2;
drive_bearing_h = 7;

// Flexspline dimensions
flex_inner_r = 25.4;
flex_h = 36;
flex_bottom_h = 2;
flex_bolthole_r = 6;
flex_wt = 0.81;
flex_lip = 1;
pitch = 197;
helix_twist = 5;

// Circspline dimensions
circ_h = 20;
circ_outer_r = 34;
circ_inner_r = 30;
circ_bottom_h = 4;
// Negative clearance cuts a bit from the top of the teeth
circ_tooth_clearance = -0.5;

// Wave driver dimensions
wave_radius = 52.75/2;
driver_h = 12;
driver_w = 10;
drive_bearing_spacing_r = wave_radius - drive_bearing_r;

// The total height of the drive unit, excluding the motor and flexspline base.
assy_h = 50;
stepper_shaft_l = 20;

tooth_overlap = (flex_h + circ_h) - assy_h;

// Position of the middle of the tooth overlap section on the stepper shaft.
stepper_shaft_mid_rot = circ_h - tooth_overlap/2;

echo(str("Tooth overlap: ", tooth_overlap));
echo(str("Drive midpoint on stepper shaft: ", stepper_shaft_mid_rot));

red_r = teeth_diff/flex_teeth;
echo(str("Reduction ratio: 1/", flex_teeth/teeth_diff, " (", red_r, ")"));
echo(str("With 200x16 motor, arc minutes per microstep: ", 360*60/(200*16)*red_r));
echo(str("Linear resolution (mm) for 100 mm arm: ", sin(360/(200*16)*red_r) * 100));
echo(str("Torque (N) at 100 mm for 40 Ncm motor: ", 4/red_r));
echo(str("Linear speed equivalent to standard Prusa's 300 mm/s at 100 mm: ",
         300*80 * sin(360/(200*16)*red_r) * 100));

// Circspline mount dimensions
circ_mount_r = circ_outer_r + 6;
circ_mount_h = 8;
circ_mount_1 = 45;
circ_mount_2 = 135;
circ_mount_3 = 225;

// Master arm height setting
main_arm1_height = 12;
main_arm2_height = 12;

// Arm 1st segment dimensions
arm_flex_base_bottom_h = 3;
arm_flex_base_h = 8;
arm_joint1_base_h = main_arm1_height;
arm_joint1_base_r = 15;
arm_joint1_bearing_indent = 7;
arm_large_bolthole_r=6;
arm_w = 30;
arm1_h = main_arm1_height;

// default length
length = 100;

// Truss generation parameters. The element width must be smaller than
// thickness to avoid the top becoming unprintable (triangle outlines
// over thin air)
truss_thickness = 3.5;
truss_width_coeff = 0.75;
truss_radius = 0.1;
truss_arm1 = 1.07; // Extra coefficient for arm1

// Arm 2nd segment dimensions
arm2_h = main_arm2_height;
arm_separation = arm_joint1_base_h - arm_joint1_bearing_indent 
  + bearing_h + washer_h * 2;
arm_bolthole_r=4;
arm_joint2_base_h = main_arm2_height;
arm_joint2_base_r = 15;
arm_joint3_hollow_r = 10;
arm_joint31_base_h = main_arm2_height;
arm_joint31_base_r = 15;
arm_joint31_bearing_r = 13/2;
arm_joint31_bearing_h = 5;
arm_joint31_bearing_clearance = 2;
arm_joint32_base_h = main_arm2_height;
arm_joint32_base_r = 15;
arm_joint32_tube_h_clearance = 1;
arm_joint32_tube_wt = 2;
arm_joint32_tube_groove_depth = 1;
arm_joint31_bearing_spacing = arm_joint3_hollow_r + arm_joint32_tube_wt 
  + arm_joint31_bearing_r;

echo(str("Arm final stage vertical separation: ", arm_separation));
echo(str("Arm final stage total height: ", arm_separation + 2 * arm2_h));

// Default arm lengths
arm1_length = 100;
arm2_length = 150;
arm_spacing = 75;
arm_base_maxrot = 90 - asin((circ_outer_r + arm_w/2) / arm_spacing);
arm_joint_maxrot = 150; // hand-tuned
echo(str("Arm base minimum rotation to clear other base: ", arm_base_maxrot));

// Z carriage dimensions
carr_floor = 1; // Carriage floor thickness.
carr_wt = 3; // Carriage wall thickness.
carr_truss_width = arm_spacing + bearing_r * 2 + 4; // 120;
carr_truss_depth = 15;
drive_h = assy_h + bearing_h + washer_h 
  + arm_flex_base_bottom_h; // Total length needed by the drive unit.
carr_truss_length = circ_outer_r + 1 + carr_wt + bearing_r + 2;
carr_rod_offset = -45;
carr_drive_offset = -40;
carr_top_support_thickness = 3;
carr_top_support_width = 14;
carr_top_support_length = 70;

// Z end dimensions
z_end_bottom_thickness = 7;
z_end_bottom_width = arm_spacing + 20;
z_end_bottom_length = 40;
z_end_top_length = 50;
z_end_bottom_height = 30;
z_end_rod_offset = 24; // rod center from vertical plate
// main file
include <configuration.scad>;
use <circspline.scad>;

circspline_unit_motor_mount();
